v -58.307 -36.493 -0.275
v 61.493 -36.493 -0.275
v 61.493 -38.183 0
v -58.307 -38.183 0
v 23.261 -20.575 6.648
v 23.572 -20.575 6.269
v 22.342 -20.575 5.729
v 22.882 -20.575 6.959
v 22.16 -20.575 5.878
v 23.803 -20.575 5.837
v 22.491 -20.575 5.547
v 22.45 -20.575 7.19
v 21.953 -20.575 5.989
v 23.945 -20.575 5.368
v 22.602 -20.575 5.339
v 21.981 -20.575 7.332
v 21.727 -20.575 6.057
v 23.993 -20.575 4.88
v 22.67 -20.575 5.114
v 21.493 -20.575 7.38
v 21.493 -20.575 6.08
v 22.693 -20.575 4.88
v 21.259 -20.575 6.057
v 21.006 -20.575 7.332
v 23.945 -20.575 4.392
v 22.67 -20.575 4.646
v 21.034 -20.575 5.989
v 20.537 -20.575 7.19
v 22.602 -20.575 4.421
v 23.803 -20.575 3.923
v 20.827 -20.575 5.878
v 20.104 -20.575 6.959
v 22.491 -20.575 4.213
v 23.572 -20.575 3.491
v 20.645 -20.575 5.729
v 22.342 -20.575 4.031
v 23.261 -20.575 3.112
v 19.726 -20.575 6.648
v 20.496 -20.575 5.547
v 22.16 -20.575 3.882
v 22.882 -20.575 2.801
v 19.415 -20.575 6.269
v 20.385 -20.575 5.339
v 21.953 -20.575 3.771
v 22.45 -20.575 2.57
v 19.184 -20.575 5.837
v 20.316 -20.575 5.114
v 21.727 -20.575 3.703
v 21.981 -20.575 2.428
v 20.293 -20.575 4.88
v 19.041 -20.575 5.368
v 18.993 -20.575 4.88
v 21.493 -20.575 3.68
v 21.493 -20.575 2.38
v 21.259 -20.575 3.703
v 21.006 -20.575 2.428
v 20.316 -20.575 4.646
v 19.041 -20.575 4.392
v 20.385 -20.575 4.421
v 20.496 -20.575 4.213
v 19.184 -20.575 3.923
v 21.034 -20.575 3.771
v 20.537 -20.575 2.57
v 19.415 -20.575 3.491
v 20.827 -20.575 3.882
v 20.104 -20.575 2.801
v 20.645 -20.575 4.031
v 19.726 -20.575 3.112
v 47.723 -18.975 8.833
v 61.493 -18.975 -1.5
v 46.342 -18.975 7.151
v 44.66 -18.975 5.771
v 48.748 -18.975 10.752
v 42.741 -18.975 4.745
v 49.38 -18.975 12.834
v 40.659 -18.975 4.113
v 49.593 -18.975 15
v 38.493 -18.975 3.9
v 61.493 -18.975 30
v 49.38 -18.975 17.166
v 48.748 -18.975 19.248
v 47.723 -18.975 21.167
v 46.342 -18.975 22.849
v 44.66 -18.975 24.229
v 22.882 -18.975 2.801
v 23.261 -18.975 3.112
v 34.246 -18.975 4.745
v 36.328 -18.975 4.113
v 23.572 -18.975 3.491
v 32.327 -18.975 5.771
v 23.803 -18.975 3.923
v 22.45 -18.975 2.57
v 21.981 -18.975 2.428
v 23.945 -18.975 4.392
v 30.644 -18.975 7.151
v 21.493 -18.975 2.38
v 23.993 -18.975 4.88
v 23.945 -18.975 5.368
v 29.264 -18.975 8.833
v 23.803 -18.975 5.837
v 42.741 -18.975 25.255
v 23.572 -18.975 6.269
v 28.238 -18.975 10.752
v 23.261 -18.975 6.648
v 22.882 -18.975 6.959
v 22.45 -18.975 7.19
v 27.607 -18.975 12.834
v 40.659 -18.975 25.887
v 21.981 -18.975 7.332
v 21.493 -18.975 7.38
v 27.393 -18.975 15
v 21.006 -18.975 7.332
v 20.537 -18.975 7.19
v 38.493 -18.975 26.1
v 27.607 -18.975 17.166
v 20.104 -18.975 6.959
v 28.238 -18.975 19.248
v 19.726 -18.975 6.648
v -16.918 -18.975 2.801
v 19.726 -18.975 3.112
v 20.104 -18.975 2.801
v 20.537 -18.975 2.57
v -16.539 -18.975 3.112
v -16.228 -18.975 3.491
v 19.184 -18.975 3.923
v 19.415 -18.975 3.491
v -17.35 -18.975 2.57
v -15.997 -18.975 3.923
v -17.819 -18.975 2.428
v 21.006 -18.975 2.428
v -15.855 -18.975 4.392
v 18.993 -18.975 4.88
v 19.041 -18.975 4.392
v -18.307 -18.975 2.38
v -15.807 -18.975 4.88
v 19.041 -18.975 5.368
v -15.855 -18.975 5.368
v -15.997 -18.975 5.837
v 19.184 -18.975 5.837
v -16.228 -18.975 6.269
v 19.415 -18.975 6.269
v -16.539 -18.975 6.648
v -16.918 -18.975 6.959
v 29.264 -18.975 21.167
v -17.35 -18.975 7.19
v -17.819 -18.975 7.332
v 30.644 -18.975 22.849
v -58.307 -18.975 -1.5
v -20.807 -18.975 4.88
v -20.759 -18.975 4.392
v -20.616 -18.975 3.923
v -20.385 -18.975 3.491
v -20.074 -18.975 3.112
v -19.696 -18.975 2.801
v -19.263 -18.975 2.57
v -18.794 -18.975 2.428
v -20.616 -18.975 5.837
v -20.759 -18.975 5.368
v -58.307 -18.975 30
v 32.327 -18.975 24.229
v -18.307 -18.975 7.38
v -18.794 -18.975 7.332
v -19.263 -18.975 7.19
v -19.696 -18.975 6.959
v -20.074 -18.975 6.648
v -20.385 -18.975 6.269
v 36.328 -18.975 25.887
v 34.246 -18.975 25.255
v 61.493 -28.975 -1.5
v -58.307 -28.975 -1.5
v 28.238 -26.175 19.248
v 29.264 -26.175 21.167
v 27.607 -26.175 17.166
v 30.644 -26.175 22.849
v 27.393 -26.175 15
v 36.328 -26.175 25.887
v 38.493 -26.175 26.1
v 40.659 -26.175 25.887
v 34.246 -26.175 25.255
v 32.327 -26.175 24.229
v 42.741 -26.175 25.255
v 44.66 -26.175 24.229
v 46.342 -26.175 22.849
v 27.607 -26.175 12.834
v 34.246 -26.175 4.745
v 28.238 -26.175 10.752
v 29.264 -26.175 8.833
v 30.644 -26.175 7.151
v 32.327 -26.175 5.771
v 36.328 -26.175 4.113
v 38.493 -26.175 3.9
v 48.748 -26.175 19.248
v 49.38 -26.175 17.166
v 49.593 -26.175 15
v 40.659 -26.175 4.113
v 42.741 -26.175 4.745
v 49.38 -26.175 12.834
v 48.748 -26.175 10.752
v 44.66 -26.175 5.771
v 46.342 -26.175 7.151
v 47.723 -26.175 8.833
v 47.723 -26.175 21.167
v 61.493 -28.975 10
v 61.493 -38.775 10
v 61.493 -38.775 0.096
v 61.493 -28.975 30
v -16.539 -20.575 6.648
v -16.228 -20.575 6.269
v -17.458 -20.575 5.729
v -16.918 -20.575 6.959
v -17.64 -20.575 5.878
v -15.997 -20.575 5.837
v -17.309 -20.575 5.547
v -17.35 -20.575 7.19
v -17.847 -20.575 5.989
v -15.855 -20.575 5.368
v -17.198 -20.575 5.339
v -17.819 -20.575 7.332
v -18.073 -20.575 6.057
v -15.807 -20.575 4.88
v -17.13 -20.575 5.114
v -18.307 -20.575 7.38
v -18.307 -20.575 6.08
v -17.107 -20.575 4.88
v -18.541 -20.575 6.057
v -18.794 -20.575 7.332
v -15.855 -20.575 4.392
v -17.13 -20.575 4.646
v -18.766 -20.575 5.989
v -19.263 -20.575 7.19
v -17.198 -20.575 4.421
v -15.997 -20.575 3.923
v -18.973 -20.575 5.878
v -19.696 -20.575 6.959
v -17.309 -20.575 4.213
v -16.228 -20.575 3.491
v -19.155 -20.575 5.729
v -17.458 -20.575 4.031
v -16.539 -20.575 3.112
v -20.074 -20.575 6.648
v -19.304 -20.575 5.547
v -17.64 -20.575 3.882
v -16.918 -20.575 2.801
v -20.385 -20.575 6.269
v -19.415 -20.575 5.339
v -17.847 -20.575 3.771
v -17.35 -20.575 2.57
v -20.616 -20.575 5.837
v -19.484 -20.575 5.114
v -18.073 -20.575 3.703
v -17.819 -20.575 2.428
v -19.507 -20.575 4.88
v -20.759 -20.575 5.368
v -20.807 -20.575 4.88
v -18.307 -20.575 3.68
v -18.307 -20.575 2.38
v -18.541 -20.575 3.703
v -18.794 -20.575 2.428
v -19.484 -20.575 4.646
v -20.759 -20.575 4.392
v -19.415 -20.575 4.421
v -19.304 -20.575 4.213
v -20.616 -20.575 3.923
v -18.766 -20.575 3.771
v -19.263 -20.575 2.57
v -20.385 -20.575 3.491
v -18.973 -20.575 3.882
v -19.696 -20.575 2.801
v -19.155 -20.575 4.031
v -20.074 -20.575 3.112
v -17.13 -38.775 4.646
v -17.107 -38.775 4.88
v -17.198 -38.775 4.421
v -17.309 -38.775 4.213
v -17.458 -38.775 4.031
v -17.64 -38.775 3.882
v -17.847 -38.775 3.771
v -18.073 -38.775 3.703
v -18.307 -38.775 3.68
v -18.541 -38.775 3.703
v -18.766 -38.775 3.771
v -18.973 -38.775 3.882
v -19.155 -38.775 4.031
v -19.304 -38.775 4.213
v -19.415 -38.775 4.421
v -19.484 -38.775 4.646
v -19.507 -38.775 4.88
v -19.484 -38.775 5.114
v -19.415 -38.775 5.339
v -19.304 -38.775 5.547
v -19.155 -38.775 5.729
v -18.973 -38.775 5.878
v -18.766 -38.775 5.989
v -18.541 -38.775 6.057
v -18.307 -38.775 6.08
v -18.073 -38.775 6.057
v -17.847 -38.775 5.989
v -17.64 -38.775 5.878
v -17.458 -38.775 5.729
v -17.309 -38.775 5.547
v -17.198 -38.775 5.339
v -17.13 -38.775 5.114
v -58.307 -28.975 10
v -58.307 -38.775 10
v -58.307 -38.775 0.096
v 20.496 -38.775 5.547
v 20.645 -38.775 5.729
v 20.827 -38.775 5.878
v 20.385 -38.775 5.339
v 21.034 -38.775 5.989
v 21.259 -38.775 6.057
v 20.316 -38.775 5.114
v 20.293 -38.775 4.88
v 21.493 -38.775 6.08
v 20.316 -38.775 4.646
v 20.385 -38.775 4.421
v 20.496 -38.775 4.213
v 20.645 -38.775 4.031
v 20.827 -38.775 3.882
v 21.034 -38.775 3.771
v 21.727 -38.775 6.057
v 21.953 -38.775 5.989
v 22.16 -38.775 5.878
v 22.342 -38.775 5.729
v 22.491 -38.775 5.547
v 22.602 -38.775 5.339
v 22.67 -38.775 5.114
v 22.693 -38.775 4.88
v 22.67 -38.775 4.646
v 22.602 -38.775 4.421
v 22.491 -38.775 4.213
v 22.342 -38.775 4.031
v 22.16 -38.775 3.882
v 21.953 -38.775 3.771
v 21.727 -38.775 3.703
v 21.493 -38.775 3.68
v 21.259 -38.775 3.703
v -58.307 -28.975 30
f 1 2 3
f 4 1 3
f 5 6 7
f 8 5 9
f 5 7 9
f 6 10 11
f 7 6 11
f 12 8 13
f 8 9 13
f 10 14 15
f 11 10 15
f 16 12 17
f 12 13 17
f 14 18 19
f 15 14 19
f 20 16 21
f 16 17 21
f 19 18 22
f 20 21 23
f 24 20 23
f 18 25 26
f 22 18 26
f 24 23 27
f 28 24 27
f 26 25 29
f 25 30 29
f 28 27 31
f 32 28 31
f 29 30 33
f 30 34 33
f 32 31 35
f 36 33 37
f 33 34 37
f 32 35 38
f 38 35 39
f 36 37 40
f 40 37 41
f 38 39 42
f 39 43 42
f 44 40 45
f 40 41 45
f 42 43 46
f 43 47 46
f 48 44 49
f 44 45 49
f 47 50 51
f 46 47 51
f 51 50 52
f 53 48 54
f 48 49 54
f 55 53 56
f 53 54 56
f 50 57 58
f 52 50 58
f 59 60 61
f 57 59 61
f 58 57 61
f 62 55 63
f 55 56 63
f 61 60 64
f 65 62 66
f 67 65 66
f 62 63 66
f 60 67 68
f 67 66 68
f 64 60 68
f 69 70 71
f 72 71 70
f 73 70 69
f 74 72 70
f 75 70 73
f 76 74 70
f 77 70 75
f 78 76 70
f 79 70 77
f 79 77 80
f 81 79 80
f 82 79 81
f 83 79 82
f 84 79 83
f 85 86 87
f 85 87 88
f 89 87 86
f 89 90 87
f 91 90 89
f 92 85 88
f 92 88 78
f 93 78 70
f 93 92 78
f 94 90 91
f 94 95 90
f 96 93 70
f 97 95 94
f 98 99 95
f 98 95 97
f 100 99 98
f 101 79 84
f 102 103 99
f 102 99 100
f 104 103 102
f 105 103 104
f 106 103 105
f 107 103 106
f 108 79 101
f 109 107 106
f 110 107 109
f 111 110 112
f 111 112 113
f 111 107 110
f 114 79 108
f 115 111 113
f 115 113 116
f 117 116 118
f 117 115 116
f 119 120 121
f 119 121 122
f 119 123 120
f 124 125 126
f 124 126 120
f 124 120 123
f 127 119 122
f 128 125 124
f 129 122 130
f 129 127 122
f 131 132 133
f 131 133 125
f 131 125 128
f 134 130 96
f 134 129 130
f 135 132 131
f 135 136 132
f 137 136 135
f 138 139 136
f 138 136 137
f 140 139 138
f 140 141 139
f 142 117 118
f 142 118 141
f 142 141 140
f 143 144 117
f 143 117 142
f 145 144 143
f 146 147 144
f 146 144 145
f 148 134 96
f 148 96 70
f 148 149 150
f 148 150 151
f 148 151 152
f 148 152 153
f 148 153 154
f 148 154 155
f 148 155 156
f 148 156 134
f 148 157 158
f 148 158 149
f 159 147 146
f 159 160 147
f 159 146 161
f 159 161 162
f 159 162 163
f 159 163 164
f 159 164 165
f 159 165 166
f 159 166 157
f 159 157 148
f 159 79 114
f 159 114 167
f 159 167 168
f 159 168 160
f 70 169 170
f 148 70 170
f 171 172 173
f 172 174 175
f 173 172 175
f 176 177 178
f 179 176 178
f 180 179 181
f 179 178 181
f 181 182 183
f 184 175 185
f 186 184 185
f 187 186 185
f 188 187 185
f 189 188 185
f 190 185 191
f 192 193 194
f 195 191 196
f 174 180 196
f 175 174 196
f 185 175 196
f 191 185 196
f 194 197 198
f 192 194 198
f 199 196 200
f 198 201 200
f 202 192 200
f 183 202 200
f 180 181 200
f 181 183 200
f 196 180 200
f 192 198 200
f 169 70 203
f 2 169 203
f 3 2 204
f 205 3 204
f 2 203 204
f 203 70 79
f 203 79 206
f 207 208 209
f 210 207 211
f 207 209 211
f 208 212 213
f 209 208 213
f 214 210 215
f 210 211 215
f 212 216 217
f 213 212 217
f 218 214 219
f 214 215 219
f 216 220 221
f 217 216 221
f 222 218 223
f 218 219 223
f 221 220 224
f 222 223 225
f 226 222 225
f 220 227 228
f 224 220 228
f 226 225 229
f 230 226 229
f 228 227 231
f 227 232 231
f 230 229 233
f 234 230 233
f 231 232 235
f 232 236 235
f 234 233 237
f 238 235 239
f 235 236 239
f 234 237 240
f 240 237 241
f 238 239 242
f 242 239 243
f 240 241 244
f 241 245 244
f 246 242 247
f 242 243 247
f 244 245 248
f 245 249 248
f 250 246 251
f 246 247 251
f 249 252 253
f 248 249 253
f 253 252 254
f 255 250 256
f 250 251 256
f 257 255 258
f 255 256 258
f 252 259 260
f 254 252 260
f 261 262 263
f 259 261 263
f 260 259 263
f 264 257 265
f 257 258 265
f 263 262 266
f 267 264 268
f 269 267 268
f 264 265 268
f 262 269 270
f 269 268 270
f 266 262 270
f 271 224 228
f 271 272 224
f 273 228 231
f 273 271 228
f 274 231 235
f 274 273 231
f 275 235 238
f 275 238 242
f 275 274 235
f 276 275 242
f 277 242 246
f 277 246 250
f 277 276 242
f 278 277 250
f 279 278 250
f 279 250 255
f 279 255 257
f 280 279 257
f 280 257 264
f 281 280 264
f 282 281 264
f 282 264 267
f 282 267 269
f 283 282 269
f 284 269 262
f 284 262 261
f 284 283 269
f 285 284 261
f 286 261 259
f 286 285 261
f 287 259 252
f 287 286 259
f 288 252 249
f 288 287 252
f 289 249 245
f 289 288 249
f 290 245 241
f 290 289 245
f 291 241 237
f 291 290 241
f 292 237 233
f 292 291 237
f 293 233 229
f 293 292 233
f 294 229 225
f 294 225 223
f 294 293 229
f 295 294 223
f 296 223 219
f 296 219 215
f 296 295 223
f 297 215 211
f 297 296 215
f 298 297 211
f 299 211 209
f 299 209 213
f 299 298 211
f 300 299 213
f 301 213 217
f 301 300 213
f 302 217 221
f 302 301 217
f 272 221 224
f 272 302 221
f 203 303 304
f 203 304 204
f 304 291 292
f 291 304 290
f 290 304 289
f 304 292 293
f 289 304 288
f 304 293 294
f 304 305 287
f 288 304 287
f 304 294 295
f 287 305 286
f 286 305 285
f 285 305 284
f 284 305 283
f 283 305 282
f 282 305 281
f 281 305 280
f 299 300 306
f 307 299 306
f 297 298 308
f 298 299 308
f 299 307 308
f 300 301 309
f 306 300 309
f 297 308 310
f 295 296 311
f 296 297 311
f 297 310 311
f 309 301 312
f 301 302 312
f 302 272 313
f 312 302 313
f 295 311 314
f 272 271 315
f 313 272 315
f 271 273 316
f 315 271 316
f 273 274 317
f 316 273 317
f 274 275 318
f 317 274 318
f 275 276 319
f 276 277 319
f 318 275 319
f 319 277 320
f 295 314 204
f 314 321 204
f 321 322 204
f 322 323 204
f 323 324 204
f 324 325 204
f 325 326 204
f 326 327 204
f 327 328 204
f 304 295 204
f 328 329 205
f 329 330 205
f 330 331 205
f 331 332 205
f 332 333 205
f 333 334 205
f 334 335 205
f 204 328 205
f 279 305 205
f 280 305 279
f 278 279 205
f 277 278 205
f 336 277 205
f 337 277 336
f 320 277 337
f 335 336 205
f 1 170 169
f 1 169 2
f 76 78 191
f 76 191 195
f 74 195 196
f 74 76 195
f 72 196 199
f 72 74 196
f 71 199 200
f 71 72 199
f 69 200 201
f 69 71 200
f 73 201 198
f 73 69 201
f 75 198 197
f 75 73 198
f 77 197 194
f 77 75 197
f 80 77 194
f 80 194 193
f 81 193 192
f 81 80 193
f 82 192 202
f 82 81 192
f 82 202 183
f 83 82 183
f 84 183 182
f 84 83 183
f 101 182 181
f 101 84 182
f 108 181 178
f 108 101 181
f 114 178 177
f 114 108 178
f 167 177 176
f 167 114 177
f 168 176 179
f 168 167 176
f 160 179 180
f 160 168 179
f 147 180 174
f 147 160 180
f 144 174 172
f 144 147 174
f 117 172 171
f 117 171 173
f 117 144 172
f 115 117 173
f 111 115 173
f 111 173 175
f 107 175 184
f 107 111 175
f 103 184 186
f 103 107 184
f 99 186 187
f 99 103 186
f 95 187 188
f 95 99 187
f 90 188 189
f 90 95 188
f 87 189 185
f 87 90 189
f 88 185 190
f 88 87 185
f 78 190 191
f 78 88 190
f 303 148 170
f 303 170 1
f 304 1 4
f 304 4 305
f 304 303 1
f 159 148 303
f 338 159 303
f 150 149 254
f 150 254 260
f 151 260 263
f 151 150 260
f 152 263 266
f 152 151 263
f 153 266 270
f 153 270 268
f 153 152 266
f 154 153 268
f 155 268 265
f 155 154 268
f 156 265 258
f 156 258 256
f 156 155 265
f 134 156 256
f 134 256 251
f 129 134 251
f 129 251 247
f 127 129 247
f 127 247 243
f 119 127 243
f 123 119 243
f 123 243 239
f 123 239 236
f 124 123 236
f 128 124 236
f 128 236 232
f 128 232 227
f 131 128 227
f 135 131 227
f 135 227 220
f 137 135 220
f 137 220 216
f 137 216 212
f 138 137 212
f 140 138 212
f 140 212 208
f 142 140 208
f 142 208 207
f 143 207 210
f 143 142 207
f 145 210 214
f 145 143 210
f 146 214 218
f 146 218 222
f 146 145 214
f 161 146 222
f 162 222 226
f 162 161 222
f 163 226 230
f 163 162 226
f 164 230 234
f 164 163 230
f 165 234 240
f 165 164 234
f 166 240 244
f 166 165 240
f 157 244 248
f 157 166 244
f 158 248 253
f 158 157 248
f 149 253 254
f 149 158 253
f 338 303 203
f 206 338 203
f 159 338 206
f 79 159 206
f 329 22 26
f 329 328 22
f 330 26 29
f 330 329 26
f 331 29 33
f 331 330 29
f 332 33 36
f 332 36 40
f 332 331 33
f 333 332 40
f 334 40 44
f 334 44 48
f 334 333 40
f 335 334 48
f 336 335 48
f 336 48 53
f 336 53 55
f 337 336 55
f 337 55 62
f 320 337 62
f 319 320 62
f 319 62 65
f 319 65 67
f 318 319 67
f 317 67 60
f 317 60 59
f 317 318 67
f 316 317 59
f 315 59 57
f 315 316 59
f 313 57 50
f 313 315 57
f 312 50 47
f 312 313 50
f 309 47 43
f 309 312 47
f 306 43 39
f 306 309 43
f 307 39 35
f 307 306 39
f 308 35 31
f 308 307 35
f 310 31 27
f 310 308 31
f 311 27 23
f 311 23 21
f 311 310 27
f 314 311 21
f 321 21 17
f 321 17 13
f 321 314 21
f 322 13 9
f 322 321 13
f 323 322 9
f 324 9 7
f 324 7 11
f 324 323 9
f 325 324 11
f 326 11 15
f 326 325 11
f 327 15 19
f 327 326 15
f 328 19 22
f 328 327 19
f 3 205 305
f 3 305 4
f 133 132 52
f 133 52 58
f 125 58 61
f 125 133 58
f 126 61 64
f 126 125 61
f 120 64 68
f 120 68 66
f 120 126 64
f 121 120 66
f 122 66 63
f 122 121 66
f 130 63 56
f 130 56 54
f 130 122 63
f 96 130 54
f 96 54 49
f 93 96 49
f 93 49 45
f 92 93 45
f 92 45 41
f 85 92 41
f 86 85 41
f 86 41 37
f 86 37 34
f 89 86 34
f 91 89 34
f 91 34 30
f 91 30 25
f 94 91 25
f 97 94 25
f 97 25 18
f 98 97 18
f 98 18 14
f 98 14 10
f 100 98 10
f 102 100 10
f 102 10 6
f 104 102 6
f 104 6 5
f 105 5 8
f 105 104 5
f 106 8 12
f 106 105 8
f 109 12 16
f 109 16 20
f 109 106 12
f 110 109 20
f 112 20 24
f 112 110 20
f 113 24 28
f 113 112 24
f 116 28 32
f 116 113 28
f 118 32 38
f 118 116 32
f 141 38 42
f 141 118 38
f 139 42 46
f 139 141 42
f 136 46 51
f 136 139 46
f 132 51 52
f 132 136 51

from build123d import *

# Parameters (mm, degrees)
SZKIC1_W                                             = 119.8
SZKIC1_H                                             = 10
DODANIE_WYCI_GNI_CIE2_DEPTH                          = 30
SZKIC21_W                                            = 119.8
SZKIC21_H                                            = 10
DODANIE_WYCI_GNI_CIE3_DEPTH                          = 9.8
POG_BIENIE_WALCOWE_POD_M2_WKR_T_DO_CZ_CI_D           = 2.4
POG_BIENIE_WALCOWE_POD_M2_WKR_T_DO_CZ_CI_CBORE_D     = 5
POG_BIENIE_WALCOWE_POD_M2_WKR_T_DO_CZ_CI_CBORE_DEPTH = 1.6
SZKIC28_R                                            = 11.1
WYTNIJ_WYCI_GNI_CIE1_DEPTH                           = 7.2
WYTNIJ_WYCI_GNI_CIE4_DEPTH                           = 124.8
DODANIE_WYCI_GNI_CIE5_DEPTH                          = 119.8
SZKIC34_W                                            = 119.8
SZKIC34_H                                            = 10
DODANIE_WYCI_GNI_CIE6_DEPTH                          = 1.5


with BuildPart() as part:
    # Szkic1 → Dodanie-wyciągnięcie2 (new body)
    with BuildSketch(Plane.XY):
        with Locations((1.59336777, 27.024849398)):
            Rectangle(SZKIC1_W, SZKIC1_H)
    extrude(amount=DODANIE_WYCI_GNI_CIE2_DEPTH)

    # Szkic21 → Dodanie-wyciągnięcie3 (add)
    with BuildSketch(Plane(origin=(0, 32.024849398, 0), x_dir=(1, 0, 0), z_dir=(0, 1, 0))):
        with Locations((1.59336777, -5)):
            Rectangle(SZKIC21_W, SZKIC21_H)
    extrude(amount=DODANIE_WYCI_GNI_CIE3_DEPTH)

    # Pogłębienie walcowe pod M2 wkręt do części metalowych z łbem stożkowym ściętym2 (through all)
    with Locations(Plane(origin=(0, 22.024849398, 0), x_dir=(-1, 0, 0), z_dir=(0, -1, 0))):
        with Locations((-21.49336777, -4.88), (18.30663223, -4.88)):
            CounterBoreHole(POG_BIENIE_WALCOWE_POD_M2_WKR_T_DO_CZ_CI_D / 2, POG_BIENIE_WALCOWE_POD_M2_WKR_T_DO_CZ_CI_CBORE_D / 2, POG_BIENIE_WALCOWE_POD_M2_WKR_T_DO_CZ_CI_CBORE_DEPTH)

    # Szkic28 → Wytnij-wyciągnięcie1 (cut)
    with BuildSketch(Plane.XZ.offset(-22.024849398)):
        with Locations((38.49336777, 15)):
            Circle(SZKIC28_R)
    extrude(amount=-WYTNIJ_WYCI_GNI_CIE1_DEPTH, mode=Mode.SUBTRACT)

    # Szkic31 → Wytnij-wyciągnięcie4 (cut)
    with BuildSketch(Plane(origin=(61.49336777, 0, 0), x_dir=(0, 0, -1), z_dir=(1, 0, 0))):
        Polygon((0, 41.824849398), (-0.096491228, 41.824849398), (0, 41.232541705), align=None)
    extrude(amount=-WYTNIJ_WYCI_GNI_CIE4_DEPTH, mode=Mode.SUBTRACT)

    # Szkic31<5> → Dodanie-wyciągnięcie5 (add)
    with BuildSketch(Plane(origin=(61.49336777, 0, 0), x_dir=(0, 0, -1), z_dir=(1, 0, 0))):
        Polygon((0, 41.232541705), (0, 32.024849398), (1.5, 32.024849398), (0.275236278, 39.543014399), align=None)
    extrude(amount=-DODANIE_WYCI_GNI_CIE5_DEPTH)

    # Szkic34 → Dodanie-wyciągnięcie6 (add)
    with BuildSketch(Plane(origin=(0, 0, 0), x_dir=(-1, 0, 0), z_dir=(0, 0, -1))):
        with Locations((-1.59336777, 27.024849398)):
            Rectangle(SZKIC34_W, SZKIC34_H)
    extrude(amount=DODANIE_WYCI_GNI_CIE6_DEPTH)


with BuildPart() as body_2:
    # Lustro2: mirrored copy
    add(part.part.mirror(Plane(origin=(-58.30663223, 22.024849398, 30), x_dir=(0, 0, 1), z_dir=(0, 1, 0))))


with BuildPart() as body_2_1:
    # Obiekt-Przenieś/Kopiuj1: moved
    add(body_2.part.moved(Location((0, -41, 0))))


solid = body_2_1.part
